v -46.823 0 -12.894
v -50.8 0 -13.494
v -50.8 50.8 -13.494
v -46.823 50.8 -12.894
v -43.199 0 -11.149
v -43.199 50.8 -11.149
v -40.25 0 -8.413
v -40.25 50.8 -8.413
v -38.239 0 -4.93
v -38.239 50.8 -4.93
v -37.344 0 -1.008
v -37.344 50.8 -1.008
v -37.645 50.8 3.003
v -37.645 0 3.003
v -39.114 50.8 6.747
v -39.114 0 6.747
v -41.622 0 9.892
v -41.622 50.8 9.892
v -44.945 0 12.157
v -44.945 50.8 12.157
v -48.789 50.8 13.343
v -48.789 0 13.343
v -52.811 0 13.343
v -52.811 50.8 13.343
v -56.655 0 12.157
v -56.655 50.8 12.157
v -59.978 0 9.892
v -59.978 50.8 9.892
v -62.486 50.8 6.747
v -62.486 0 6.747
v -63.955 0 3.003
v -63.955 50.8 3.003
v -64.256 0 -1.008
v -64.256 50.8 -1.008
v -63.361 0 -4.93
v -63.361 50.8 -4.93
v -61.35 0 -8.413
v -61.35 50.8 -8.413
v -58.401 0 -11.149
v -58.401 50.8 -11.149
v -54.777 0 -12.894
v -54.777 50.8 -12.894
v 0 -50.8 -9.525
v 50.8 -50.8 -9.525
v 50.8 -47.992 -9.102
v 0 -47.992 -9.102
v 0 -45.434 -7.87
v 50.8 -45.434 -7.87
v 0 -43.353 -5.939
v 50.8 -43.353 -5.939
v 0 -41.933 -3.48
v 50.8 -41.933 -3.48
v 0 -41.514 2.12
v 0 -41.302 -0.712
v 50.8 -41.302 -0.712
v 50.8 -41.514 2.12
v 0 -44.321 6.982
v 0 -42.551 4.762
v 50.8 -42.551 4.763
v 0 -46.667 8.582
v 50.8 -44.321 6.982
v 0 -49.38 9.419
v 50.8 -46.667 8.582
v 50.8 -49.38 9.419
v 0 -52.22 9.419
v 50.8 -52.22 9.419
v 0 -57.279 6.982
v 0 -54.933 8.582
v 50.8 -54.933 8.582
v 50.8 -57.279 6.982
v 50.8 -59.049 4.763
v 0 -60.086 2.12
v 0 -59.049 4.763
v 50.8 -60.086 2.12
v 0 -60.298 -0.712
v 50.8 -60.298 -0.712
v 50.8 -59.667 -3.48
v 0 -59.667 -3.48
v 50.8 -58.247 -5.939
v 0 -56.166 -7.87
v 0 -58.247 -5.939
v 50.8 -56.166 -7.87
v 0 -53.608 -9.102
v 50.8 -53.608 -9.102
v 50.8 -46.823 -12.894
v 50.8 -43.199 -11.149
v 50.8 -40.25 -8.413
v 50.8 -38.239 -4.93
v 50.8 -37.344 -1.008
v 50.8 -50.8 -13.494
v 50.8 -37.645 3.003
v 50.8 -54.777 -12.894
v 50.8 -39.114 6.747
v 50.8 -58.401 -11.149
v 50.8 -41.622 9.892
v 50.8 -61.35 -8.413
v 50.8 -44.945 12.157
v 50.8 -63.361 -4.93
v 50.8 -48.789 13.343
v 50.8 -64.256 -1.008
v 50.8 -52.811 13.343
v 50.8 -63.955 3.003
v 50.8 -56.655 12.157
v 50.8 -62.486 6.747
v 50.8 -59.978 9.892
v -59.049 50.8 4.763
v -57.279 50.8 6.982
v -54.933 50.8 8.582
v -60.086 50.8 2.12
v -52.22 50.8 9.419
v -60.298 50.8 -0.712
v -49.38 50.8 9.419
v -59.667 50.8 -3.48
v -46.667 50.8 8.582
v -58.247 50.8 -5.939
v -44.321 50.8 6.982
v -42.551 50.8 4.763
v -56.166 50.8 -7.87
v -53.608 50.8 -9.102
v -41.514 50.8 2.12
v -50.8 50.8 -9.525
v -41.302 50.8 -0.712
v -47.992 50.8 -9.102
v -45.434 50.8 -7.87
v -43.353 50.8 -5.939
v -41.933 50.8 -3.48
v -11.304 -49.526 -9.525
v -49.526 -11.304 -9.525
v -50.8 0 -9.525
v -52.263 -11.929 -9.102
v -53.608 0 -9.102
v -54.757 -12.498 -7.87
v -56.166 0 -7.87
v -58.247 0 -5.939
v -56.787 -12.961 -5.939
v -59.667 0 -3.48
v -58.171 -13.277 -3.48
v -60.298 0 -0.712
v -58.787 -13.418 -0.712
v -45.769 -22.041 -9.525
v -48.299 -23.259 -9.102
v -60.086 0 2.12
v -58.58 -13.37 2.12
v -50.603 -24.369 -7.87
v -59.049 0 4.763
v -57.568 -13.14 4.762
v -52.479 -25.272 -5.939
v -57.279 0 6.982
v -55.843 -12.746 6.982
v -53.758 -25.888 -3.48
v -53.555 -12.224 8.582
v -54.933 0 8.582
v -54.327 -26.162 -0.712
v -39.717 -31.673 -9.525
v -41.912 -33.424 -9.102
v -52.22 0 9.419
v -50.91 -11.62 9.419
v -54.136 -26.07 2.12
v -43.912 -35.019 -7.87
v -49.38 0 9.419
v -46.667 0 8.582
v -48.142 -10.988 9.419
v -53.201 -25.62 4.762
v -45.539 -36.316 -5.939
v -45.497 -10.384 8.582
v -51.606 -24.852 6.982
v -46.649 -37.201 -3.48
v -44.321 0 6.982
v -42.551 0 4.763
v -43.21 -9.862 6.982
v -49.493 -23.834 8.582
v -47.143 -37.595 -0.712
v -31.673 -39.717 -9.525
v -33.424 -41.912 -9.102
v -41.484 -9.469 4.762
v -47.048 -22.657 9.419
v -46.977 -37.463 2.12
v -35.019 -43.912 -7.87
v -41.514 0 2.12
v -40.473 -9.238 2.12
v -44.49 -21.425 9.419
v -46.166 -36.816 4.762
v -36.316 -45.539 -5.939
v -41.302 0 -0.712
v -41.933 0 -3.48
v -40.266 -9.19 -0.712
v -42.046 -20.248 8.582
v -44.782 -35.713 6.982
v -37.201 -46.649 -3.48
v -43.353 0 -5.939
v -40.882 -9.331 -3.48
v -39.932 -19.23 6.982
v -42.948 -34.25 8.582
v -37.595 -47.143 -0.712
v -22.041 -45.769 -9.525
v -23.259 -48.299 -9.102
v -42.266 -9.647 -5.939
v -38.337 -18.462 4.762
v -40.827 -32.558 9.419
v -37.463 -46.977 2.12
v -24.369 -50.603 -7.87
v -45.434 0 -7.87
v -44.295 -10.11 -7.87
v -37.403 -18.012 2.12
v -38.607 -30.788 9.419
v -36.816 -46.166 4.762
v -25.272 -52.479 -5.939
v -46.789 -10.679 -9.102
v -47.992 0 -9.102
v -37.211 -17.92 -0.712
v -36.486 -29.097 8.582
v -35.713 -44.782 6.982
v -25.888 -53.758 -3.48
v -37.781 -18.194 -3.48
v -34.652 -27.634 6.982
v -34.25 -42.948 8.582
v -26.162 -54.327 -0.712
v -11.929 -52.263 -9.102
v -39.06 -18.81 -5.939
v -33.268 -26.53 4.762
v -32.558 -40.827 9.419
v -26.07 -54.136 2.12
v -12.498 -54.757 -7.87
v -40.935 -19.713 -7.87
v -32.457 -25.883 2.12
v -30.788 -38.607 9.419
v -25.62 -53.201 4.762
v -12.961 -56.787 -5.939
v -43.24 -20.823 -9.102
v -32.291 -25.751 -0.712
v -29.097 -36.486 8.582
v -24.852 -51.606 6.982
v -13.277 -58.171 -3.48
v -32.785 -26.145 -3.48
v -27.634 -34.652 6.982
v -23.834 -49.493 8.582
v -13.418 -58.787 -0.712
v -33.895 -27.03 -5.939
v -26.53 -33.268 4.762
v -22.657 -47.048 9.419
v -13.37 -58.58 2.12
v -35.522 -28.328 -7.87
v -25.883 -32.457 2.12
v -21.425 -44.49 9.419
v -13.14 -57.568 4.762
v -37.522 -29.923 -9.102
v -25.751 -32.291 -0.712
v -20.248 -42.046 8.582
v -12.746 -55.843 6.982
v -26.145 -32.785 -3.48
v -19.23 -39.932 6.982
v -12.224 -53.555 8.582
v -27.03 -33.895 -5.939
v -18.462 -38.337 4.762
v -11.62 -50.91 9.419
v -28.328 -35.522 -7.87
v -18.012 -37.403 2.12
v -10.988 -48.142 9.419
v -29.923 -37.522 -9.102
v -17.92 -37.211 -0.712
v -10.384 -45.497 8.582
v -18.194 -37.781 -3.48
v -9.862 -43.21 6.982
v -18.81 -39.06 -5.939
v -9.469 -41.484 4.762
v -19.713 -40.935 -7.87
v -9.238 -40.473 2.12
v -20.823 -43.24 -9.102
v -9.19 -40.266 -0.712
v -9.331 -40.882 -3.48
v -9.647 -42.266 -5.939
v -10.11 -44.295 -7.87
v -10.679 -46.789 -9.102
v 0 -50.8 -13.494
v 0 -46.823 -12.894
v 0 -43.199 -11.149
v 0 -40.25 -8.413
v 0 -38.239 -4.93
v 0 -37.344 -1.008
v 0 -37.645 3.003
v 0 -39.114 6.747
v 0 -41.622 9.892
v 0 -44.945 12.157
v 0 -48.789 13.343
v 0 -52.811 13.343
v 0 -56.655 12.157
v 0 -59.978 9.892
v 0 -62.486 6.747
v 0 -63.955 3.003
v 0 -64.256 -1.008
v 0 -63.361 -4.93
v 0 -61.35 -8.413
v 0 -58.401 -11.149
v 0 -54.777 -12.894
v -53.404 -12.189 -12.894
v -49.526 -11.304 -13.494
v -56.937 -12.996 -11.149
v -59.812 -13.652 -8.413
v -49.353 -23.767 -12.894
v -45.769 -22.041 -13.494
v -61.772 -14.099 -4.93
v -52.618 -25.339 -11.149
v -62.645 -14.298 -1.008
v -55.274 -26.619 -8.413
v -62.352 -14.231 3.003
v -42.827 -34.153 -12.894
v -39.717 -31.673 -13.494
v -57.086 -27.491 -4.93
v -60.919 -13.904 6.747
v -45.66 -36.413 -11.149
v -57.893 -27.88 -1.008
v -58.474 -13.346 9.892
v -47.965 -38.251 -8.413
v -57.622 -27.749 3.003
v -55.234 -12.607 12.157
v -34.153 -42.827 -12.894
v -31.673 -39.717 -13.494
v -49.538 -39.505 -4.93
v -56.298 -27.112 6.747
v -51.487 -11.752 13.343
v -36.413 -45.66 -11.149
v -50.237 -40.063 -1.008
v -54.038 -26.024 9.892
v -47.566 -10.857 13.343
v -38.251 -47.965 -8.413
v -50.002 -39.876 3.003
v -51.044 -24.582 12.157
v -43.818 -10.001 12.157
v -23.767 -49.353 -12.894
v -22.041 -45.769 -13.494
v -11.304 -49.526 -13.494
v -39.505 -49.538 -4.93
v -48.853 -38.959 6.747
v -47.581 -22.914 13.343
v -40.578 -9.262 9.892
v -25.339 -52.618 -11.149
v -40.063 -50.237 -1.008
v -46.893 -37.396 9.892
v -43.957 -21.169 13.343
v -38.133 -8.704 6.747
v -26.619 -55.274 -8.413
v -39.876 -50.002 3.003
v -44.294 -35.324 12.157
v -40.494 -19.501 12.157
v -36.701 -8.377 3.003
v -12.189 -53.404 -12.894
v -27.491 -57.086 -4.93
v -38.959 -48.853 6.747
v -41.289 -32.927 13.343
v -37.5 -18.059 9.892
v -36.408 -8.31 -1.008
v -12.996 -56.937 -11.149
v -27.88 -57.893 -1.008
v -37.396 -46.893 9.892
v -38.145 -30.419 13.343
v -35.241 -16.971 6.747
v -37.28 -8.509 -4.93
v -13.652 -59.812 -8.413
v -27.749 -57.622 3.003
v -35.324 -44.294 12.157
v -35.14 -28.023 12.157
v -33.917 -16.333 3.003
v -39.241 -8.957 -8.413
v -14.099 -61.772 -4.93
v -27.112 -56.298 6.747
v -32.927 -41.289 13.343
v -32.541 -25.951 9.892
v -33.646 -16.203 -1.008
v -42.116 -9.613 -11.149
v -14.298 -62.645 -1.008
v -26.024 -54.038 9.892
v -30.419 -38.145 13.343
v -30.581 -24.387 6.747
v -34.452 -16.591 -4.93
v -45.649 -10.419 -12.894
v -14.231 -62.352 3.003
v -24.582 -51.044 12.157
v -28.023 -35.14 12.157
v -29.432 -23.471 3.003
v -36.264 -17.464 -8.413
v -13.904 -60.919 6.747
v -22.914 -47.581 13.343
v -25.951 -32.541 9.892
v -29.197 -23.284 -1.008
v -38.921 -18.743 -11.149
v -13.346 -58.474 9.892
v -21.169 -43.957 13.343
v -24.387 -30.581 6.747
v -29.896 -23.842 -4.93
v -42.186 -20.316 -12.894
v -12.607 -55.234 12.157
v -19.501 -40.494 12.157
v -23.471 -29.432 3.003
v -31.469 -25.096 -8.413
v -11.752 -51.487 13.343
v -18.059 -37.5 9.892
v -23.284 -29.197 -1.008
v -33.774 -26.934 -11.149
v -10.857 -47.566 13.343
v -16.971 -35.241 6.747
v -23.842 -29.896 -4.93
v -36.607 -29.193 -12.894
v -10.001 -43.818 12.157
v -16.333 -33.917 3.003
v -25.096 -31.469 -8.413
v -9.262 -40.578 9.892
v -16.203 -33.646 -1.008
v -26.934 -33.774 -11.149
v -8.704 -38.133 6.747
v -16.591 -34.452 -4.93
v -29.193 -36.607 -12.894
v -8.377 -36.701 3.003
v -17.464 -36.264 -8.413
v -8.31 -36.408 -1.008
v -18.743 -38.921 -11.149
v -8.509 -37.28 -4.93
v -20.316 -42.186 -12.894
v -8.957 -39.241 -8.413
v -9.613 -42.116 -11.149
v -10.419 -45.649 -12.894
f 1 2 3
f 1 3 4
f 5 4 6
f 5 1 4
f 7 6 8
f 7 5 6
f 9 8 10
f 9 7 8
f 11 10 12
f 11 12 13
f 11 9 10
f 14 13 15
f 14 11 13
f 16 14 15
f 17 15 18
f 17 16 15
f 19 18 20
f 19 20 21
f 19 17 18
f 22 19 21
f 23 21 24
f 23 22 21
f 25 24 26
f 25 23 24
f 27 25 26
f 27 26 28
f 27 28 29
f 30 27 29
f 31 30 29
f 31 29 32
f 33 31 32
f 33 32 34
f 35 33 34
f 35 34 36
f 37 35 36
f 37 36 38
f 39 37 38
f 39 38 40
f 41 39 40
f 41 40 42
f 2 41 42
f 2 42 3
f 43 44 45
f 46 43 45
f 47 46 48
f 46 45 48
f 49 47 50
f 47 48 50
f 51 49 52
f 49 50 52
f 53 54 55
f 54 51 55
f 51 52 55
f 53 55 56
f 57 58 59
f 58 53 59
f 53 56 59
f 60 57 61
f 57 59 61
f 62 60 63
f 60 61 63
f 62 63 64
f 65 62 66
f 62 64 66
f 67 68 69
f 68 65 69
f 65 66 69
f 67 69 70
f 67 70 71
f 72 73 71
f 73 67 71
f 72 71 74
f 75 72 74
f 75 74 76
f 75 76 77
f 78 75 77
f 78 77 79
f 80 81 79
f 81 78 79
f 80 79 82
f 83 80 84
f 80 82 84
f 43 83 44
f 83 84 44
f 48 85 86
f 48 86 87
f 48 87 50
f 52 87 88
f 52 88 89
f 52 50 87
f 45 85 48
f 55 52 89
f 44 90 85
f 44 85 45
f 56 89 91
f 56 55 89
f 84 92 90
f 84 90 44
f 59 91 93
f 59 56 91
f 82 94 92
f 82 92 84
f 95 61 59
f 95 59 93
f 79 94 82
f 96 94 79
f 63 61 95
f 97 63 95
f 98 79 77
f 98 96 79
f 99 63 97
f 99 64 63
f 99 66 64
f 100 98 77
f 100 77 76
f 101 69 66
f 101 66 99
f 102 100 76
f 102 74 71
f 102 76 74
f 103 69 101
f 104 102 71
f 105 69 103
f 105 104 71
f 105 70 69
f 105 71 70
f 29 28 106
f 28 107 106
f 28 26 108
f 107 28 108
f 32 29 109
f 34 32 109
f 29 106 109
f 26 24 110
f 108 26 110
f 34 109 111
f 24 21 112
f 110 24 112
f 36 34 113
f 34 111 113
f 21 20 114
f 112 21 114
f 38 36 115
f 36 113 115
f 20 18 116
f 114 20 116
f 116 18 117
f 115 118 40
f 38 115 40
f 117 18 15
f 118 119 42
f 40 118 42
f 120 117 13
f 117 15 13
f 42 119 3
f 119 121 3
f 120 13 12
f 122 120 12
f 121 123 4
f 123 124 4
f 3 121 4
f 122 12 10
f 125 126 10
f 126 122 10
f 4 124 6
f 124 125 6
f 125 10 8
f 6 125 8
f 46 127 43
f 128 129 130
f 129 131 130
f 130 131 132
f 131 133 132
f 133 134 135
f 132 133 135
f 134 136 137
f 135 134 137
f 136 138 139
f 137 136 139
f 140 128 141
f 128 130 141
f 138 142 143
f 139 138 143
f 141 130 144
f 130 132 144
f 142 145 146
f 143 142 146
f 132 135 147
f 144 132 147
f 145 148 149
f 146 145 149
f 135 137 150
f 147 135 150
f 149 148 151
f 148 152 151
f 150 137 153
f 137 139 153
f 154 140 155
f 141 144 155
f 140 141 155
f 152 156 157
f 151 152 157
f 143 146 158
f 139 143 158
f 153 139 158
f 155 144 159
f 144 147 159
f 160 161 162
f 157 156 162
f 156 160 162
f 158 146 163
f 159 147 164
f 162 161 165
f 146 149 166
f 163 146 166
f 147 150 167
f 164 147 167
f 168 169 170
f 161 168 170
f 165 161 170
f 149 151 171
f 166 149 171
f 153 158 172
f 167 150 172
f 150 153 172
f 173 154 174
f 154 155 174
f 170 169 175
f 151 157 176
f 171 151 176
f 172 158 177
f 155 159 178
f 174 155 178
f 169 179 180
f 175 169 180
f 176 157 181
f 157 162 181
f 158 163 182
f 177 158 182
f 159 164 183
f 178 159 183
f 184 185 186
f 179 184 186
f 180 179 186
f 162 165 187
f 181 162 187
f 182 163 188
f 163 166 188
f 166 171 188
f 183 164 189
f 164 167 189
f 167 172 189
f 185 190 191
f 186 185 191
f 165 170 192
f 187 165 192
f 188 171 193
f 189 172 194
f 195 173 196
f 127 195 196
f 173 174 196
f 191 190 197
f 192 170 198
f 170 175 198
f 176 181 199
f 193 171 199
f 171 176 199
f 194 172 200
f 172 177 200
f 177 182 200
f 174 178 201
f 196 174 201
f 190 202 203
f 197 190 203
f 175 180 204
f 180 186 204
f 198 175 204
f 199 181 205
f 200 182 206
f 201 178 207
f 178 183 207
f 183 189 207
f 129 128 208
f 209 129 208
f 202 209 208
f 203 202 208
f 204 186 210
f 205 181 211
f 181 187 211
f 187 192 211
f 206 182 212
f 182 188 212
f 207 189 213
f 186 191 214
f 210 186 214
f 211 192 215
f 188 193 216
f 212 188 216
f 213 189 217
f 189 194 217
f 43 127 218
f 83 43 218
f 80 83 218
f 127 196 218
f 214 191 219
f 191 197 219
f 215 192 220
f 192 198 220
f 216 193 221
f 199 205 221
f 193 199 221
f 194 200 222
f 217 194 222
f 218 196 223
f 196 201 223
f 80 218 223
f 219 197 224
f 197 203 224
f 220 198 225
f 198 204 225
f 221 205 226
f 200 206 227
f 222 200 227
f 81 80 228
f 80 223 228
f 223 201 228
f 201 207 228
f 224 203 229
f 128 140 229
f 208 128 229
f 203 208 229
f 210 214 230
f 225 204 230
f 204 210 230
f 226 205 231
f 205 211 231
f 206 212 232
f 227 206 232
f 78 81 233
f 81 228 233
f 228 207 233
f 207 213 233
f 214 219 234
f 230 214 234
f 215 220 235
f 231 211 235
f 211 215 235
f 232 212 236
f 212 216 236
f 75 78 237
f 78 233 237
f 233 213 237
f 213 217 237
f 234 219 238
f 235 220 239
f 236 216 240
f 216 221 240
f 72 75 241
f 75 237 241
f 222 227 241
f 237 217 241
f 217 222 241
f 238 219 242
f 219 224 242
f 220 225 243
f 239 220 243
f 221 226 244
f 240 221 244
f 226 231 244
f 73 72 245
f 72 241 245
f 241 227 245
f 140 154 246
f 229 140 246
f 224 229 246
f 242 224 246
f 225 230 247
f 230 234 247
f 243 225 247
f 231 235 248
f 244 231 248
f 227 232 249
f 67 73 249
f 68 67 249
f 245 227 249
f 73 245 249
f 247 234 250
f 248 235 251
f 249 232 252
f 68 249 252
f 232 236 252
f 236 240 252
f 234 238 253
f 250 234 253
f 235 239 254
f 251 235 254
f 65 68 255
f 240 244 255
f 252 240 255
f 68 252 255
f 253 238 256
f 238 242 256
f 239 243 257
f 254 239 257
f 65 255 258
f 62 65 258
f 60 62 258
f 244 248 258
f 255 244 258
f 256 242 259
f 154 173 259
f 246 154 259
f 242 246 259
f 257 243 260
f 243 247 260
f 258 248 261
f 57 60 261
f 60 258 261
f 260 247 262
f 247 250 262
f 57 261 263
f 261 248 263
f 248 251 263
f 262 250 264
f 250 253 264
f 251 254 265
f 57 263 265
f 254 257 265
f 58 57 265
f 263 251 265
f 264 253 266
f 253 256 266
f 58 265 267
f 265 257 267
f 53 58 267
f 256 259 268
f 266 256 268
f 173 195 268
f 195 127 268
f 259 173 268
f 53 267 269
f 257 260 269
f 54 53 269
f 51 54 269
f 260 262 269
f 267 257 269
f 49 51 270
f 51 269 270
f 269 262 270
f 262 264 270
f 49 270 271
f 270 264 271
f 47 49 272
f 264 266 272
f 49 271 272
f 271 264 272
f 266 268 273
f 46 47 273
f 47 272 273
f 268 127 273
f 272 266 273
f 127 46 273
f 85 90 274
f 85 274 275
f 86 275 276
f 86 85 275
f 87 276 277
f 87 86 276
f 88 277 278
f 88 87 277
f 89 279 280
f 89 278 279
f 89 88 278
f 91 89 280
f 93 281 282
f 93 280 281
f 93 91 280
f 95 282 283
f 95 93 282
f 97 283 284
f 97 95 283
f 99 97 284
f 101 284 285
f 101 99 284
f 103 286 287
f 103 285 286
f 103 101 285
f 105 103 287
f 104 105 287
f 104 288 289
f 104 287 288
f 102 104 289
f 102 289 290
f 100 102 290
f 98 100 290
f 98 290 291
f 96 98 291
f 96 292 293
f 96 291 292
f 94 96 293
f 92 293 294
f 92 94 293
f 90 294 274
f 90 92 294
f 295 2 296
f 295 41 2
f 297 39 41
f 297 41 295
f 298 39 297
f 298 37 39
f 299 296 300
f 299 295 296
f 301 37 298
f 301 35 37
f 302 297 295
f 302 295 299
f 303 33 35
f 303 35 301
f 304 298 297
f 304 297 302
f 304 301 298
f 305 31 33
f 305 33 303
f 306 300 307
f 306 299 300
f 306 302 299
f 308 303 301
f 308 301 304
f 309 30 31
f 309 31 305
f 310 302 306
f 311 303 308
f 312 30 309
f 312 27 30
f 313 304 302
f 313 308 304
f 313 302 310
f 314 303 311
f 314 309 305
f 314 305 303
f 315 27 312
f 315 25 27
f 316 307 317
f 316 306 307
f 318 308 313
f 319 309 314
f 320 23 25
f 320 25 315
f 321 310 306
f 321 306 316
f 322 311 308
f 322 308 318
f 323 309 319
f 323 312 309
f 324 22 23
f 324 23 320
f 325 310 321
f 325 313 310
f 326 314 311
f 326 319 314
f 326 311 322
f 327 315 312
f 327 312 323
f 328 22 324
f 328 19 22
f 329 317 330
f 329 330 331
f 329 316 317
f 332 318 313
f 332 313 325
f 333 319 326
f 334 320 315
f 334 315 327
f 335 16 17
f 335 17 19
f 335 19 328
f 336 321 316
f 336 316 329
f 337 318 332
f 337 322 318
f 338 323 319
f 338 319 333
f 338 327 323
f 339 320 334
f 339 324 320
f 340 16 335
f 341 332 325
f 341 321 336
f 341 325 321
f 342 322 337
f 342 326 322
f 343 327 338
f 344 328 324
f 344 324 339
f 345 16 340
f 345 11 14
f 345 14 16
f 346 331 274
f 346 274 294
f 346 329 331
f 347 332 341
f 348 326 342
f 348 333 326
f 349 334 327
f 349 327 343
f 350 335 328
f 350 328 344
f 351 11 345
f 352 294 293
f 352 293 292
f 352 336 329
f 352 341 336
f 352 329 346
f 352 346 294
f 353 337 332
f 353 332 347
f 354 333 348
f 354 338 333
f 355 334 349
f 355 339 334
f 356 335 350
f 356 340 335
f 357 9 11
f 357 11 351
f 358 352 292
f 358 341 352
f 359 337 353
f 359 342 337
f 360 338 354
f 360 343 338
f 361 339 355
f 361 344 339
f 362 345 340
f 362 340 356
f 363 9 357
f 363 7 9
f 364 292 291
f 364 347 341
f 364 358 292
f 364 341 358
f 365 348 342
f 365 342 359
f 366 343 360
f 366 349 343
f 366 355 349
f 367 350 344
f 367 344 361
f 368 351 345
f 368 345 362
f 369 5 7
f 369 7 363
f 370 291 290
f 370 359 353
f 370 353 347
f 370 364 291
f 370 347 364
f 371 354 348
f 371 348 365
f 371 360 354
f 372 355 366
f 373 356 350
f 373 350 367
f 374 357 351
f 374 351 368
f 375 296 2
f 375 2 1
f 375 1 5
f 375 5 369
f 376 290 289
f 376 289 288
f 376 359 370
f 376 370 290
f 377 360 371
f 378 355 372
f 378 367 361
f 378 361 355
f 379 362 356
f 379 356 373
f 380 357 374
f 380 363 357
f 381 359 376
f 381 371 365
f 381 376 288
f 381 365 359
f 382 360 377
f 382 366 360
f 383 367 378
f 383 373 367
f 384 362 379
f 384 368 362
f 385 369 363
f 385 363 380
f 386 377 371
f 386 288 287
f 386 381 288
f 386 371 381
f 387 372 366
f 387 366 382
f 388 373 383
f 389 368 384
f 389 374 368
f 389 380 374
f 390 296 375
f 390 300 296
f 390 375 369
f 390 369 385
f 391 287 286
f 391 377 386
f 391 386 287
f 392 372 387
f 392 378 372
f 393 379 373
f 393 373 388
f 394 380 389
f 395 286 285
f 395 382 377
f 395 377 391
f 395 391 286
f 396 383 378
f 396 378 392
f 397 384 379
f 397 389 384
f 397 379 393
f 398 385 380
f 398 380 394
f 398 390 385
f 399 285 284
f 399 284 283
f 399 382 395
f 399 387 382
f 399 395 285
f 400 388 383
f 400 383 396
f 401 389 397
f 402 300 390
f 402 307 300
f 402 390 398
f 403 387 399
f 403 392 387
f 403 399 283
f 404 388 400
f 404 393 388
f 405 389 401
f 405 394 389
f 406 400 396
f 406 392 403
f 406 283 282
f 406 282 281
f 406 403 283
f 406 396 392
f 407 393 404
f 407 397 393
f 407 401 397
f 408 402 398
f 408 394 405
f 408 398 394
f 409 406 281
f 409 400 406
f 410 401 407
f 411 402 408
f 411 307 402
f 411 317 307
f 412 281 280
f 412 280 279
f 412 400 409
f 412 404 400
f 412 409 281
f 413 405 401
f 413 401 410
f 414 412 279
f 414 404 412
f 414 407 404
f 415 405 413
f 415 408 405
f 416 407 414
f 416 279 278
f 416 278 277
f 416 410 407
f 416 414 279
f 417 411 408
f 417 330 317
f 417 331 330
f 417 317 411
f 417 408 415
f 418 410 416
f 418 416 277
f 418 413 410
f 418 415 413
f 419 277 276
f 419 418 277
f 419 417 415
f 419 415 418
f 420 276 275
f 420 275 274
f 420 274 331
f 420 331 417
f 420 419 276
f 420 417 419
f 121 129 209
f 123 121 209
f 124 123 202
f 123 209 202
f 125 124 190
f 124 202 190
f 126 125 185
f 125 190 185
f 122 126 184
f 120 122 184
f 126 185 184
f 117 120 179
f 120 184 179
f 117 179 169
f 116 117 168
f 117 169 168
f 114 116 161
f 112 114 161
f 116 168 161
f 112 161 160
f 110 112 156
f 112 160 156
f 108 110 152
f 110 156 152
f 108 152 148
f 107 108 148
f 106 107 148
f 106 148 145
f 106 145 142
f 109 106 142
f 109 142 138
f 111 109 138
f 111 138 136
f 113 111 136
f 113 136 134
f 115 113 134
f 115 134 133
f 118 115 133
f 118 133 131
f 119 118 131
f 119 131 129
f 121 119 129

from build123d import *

# Parameters (mm, degrees)
SWEEP1_PROFILE_R     = 13.49375
CUT_SWEEP1_PROFILE_R = 9.525


with BuildPart() as part:
    # Sweep1: sweep along a path in Sketch1
    with BuildLine(Plane.XY) as sweep1_path:
        Line((-50.8, 50.8), (-50.8, 0))
        ThreePointArc((-50.8, 0), (-35.921024484, -35.921024484), (0, -50.8))
        Line((0, -50.8), (50.8, -50.8))
    # Sweep1 profile (on start of the path) → Sweep1 (sweep)
    with BuildSketch(Plane(origin=(-50.8, 50.8, 0), x_dir=(0, 0, -1), z_dir=(0, -1, 0))):
        Circle(SWEEP1_PROFILE_R)
    sweep(path=sweep1_path.line)

    # Cut-Sweep1: sweep along a path in Sketch1<4>
    with BuildLine(Plane.XY) as cut_sweep1_path:
        Line((-50.8, 50.8), (-50.8, 0))
        ThreePointArc((-50.8, 0), (-35.921024484, -35.921024484), (0, -50.8))
        Line((0, -50.8), (50.8, -50.8))
    # Cut-Sweep1 profile (on start of the path) → Cut-Sweep1 (sweep, cut)
    with BuildSketch(Plane(origin=(-50.8, 50.8, 0), x_dir=(0, 0, -1), z_dir=(0, -1, 0))):
        Circle(CUT_SWEEP1_PROFILE_R)
    sweep(path=cut_sweep1_path.line, mode=Mode.SUBTRACT)


solid = part.part
